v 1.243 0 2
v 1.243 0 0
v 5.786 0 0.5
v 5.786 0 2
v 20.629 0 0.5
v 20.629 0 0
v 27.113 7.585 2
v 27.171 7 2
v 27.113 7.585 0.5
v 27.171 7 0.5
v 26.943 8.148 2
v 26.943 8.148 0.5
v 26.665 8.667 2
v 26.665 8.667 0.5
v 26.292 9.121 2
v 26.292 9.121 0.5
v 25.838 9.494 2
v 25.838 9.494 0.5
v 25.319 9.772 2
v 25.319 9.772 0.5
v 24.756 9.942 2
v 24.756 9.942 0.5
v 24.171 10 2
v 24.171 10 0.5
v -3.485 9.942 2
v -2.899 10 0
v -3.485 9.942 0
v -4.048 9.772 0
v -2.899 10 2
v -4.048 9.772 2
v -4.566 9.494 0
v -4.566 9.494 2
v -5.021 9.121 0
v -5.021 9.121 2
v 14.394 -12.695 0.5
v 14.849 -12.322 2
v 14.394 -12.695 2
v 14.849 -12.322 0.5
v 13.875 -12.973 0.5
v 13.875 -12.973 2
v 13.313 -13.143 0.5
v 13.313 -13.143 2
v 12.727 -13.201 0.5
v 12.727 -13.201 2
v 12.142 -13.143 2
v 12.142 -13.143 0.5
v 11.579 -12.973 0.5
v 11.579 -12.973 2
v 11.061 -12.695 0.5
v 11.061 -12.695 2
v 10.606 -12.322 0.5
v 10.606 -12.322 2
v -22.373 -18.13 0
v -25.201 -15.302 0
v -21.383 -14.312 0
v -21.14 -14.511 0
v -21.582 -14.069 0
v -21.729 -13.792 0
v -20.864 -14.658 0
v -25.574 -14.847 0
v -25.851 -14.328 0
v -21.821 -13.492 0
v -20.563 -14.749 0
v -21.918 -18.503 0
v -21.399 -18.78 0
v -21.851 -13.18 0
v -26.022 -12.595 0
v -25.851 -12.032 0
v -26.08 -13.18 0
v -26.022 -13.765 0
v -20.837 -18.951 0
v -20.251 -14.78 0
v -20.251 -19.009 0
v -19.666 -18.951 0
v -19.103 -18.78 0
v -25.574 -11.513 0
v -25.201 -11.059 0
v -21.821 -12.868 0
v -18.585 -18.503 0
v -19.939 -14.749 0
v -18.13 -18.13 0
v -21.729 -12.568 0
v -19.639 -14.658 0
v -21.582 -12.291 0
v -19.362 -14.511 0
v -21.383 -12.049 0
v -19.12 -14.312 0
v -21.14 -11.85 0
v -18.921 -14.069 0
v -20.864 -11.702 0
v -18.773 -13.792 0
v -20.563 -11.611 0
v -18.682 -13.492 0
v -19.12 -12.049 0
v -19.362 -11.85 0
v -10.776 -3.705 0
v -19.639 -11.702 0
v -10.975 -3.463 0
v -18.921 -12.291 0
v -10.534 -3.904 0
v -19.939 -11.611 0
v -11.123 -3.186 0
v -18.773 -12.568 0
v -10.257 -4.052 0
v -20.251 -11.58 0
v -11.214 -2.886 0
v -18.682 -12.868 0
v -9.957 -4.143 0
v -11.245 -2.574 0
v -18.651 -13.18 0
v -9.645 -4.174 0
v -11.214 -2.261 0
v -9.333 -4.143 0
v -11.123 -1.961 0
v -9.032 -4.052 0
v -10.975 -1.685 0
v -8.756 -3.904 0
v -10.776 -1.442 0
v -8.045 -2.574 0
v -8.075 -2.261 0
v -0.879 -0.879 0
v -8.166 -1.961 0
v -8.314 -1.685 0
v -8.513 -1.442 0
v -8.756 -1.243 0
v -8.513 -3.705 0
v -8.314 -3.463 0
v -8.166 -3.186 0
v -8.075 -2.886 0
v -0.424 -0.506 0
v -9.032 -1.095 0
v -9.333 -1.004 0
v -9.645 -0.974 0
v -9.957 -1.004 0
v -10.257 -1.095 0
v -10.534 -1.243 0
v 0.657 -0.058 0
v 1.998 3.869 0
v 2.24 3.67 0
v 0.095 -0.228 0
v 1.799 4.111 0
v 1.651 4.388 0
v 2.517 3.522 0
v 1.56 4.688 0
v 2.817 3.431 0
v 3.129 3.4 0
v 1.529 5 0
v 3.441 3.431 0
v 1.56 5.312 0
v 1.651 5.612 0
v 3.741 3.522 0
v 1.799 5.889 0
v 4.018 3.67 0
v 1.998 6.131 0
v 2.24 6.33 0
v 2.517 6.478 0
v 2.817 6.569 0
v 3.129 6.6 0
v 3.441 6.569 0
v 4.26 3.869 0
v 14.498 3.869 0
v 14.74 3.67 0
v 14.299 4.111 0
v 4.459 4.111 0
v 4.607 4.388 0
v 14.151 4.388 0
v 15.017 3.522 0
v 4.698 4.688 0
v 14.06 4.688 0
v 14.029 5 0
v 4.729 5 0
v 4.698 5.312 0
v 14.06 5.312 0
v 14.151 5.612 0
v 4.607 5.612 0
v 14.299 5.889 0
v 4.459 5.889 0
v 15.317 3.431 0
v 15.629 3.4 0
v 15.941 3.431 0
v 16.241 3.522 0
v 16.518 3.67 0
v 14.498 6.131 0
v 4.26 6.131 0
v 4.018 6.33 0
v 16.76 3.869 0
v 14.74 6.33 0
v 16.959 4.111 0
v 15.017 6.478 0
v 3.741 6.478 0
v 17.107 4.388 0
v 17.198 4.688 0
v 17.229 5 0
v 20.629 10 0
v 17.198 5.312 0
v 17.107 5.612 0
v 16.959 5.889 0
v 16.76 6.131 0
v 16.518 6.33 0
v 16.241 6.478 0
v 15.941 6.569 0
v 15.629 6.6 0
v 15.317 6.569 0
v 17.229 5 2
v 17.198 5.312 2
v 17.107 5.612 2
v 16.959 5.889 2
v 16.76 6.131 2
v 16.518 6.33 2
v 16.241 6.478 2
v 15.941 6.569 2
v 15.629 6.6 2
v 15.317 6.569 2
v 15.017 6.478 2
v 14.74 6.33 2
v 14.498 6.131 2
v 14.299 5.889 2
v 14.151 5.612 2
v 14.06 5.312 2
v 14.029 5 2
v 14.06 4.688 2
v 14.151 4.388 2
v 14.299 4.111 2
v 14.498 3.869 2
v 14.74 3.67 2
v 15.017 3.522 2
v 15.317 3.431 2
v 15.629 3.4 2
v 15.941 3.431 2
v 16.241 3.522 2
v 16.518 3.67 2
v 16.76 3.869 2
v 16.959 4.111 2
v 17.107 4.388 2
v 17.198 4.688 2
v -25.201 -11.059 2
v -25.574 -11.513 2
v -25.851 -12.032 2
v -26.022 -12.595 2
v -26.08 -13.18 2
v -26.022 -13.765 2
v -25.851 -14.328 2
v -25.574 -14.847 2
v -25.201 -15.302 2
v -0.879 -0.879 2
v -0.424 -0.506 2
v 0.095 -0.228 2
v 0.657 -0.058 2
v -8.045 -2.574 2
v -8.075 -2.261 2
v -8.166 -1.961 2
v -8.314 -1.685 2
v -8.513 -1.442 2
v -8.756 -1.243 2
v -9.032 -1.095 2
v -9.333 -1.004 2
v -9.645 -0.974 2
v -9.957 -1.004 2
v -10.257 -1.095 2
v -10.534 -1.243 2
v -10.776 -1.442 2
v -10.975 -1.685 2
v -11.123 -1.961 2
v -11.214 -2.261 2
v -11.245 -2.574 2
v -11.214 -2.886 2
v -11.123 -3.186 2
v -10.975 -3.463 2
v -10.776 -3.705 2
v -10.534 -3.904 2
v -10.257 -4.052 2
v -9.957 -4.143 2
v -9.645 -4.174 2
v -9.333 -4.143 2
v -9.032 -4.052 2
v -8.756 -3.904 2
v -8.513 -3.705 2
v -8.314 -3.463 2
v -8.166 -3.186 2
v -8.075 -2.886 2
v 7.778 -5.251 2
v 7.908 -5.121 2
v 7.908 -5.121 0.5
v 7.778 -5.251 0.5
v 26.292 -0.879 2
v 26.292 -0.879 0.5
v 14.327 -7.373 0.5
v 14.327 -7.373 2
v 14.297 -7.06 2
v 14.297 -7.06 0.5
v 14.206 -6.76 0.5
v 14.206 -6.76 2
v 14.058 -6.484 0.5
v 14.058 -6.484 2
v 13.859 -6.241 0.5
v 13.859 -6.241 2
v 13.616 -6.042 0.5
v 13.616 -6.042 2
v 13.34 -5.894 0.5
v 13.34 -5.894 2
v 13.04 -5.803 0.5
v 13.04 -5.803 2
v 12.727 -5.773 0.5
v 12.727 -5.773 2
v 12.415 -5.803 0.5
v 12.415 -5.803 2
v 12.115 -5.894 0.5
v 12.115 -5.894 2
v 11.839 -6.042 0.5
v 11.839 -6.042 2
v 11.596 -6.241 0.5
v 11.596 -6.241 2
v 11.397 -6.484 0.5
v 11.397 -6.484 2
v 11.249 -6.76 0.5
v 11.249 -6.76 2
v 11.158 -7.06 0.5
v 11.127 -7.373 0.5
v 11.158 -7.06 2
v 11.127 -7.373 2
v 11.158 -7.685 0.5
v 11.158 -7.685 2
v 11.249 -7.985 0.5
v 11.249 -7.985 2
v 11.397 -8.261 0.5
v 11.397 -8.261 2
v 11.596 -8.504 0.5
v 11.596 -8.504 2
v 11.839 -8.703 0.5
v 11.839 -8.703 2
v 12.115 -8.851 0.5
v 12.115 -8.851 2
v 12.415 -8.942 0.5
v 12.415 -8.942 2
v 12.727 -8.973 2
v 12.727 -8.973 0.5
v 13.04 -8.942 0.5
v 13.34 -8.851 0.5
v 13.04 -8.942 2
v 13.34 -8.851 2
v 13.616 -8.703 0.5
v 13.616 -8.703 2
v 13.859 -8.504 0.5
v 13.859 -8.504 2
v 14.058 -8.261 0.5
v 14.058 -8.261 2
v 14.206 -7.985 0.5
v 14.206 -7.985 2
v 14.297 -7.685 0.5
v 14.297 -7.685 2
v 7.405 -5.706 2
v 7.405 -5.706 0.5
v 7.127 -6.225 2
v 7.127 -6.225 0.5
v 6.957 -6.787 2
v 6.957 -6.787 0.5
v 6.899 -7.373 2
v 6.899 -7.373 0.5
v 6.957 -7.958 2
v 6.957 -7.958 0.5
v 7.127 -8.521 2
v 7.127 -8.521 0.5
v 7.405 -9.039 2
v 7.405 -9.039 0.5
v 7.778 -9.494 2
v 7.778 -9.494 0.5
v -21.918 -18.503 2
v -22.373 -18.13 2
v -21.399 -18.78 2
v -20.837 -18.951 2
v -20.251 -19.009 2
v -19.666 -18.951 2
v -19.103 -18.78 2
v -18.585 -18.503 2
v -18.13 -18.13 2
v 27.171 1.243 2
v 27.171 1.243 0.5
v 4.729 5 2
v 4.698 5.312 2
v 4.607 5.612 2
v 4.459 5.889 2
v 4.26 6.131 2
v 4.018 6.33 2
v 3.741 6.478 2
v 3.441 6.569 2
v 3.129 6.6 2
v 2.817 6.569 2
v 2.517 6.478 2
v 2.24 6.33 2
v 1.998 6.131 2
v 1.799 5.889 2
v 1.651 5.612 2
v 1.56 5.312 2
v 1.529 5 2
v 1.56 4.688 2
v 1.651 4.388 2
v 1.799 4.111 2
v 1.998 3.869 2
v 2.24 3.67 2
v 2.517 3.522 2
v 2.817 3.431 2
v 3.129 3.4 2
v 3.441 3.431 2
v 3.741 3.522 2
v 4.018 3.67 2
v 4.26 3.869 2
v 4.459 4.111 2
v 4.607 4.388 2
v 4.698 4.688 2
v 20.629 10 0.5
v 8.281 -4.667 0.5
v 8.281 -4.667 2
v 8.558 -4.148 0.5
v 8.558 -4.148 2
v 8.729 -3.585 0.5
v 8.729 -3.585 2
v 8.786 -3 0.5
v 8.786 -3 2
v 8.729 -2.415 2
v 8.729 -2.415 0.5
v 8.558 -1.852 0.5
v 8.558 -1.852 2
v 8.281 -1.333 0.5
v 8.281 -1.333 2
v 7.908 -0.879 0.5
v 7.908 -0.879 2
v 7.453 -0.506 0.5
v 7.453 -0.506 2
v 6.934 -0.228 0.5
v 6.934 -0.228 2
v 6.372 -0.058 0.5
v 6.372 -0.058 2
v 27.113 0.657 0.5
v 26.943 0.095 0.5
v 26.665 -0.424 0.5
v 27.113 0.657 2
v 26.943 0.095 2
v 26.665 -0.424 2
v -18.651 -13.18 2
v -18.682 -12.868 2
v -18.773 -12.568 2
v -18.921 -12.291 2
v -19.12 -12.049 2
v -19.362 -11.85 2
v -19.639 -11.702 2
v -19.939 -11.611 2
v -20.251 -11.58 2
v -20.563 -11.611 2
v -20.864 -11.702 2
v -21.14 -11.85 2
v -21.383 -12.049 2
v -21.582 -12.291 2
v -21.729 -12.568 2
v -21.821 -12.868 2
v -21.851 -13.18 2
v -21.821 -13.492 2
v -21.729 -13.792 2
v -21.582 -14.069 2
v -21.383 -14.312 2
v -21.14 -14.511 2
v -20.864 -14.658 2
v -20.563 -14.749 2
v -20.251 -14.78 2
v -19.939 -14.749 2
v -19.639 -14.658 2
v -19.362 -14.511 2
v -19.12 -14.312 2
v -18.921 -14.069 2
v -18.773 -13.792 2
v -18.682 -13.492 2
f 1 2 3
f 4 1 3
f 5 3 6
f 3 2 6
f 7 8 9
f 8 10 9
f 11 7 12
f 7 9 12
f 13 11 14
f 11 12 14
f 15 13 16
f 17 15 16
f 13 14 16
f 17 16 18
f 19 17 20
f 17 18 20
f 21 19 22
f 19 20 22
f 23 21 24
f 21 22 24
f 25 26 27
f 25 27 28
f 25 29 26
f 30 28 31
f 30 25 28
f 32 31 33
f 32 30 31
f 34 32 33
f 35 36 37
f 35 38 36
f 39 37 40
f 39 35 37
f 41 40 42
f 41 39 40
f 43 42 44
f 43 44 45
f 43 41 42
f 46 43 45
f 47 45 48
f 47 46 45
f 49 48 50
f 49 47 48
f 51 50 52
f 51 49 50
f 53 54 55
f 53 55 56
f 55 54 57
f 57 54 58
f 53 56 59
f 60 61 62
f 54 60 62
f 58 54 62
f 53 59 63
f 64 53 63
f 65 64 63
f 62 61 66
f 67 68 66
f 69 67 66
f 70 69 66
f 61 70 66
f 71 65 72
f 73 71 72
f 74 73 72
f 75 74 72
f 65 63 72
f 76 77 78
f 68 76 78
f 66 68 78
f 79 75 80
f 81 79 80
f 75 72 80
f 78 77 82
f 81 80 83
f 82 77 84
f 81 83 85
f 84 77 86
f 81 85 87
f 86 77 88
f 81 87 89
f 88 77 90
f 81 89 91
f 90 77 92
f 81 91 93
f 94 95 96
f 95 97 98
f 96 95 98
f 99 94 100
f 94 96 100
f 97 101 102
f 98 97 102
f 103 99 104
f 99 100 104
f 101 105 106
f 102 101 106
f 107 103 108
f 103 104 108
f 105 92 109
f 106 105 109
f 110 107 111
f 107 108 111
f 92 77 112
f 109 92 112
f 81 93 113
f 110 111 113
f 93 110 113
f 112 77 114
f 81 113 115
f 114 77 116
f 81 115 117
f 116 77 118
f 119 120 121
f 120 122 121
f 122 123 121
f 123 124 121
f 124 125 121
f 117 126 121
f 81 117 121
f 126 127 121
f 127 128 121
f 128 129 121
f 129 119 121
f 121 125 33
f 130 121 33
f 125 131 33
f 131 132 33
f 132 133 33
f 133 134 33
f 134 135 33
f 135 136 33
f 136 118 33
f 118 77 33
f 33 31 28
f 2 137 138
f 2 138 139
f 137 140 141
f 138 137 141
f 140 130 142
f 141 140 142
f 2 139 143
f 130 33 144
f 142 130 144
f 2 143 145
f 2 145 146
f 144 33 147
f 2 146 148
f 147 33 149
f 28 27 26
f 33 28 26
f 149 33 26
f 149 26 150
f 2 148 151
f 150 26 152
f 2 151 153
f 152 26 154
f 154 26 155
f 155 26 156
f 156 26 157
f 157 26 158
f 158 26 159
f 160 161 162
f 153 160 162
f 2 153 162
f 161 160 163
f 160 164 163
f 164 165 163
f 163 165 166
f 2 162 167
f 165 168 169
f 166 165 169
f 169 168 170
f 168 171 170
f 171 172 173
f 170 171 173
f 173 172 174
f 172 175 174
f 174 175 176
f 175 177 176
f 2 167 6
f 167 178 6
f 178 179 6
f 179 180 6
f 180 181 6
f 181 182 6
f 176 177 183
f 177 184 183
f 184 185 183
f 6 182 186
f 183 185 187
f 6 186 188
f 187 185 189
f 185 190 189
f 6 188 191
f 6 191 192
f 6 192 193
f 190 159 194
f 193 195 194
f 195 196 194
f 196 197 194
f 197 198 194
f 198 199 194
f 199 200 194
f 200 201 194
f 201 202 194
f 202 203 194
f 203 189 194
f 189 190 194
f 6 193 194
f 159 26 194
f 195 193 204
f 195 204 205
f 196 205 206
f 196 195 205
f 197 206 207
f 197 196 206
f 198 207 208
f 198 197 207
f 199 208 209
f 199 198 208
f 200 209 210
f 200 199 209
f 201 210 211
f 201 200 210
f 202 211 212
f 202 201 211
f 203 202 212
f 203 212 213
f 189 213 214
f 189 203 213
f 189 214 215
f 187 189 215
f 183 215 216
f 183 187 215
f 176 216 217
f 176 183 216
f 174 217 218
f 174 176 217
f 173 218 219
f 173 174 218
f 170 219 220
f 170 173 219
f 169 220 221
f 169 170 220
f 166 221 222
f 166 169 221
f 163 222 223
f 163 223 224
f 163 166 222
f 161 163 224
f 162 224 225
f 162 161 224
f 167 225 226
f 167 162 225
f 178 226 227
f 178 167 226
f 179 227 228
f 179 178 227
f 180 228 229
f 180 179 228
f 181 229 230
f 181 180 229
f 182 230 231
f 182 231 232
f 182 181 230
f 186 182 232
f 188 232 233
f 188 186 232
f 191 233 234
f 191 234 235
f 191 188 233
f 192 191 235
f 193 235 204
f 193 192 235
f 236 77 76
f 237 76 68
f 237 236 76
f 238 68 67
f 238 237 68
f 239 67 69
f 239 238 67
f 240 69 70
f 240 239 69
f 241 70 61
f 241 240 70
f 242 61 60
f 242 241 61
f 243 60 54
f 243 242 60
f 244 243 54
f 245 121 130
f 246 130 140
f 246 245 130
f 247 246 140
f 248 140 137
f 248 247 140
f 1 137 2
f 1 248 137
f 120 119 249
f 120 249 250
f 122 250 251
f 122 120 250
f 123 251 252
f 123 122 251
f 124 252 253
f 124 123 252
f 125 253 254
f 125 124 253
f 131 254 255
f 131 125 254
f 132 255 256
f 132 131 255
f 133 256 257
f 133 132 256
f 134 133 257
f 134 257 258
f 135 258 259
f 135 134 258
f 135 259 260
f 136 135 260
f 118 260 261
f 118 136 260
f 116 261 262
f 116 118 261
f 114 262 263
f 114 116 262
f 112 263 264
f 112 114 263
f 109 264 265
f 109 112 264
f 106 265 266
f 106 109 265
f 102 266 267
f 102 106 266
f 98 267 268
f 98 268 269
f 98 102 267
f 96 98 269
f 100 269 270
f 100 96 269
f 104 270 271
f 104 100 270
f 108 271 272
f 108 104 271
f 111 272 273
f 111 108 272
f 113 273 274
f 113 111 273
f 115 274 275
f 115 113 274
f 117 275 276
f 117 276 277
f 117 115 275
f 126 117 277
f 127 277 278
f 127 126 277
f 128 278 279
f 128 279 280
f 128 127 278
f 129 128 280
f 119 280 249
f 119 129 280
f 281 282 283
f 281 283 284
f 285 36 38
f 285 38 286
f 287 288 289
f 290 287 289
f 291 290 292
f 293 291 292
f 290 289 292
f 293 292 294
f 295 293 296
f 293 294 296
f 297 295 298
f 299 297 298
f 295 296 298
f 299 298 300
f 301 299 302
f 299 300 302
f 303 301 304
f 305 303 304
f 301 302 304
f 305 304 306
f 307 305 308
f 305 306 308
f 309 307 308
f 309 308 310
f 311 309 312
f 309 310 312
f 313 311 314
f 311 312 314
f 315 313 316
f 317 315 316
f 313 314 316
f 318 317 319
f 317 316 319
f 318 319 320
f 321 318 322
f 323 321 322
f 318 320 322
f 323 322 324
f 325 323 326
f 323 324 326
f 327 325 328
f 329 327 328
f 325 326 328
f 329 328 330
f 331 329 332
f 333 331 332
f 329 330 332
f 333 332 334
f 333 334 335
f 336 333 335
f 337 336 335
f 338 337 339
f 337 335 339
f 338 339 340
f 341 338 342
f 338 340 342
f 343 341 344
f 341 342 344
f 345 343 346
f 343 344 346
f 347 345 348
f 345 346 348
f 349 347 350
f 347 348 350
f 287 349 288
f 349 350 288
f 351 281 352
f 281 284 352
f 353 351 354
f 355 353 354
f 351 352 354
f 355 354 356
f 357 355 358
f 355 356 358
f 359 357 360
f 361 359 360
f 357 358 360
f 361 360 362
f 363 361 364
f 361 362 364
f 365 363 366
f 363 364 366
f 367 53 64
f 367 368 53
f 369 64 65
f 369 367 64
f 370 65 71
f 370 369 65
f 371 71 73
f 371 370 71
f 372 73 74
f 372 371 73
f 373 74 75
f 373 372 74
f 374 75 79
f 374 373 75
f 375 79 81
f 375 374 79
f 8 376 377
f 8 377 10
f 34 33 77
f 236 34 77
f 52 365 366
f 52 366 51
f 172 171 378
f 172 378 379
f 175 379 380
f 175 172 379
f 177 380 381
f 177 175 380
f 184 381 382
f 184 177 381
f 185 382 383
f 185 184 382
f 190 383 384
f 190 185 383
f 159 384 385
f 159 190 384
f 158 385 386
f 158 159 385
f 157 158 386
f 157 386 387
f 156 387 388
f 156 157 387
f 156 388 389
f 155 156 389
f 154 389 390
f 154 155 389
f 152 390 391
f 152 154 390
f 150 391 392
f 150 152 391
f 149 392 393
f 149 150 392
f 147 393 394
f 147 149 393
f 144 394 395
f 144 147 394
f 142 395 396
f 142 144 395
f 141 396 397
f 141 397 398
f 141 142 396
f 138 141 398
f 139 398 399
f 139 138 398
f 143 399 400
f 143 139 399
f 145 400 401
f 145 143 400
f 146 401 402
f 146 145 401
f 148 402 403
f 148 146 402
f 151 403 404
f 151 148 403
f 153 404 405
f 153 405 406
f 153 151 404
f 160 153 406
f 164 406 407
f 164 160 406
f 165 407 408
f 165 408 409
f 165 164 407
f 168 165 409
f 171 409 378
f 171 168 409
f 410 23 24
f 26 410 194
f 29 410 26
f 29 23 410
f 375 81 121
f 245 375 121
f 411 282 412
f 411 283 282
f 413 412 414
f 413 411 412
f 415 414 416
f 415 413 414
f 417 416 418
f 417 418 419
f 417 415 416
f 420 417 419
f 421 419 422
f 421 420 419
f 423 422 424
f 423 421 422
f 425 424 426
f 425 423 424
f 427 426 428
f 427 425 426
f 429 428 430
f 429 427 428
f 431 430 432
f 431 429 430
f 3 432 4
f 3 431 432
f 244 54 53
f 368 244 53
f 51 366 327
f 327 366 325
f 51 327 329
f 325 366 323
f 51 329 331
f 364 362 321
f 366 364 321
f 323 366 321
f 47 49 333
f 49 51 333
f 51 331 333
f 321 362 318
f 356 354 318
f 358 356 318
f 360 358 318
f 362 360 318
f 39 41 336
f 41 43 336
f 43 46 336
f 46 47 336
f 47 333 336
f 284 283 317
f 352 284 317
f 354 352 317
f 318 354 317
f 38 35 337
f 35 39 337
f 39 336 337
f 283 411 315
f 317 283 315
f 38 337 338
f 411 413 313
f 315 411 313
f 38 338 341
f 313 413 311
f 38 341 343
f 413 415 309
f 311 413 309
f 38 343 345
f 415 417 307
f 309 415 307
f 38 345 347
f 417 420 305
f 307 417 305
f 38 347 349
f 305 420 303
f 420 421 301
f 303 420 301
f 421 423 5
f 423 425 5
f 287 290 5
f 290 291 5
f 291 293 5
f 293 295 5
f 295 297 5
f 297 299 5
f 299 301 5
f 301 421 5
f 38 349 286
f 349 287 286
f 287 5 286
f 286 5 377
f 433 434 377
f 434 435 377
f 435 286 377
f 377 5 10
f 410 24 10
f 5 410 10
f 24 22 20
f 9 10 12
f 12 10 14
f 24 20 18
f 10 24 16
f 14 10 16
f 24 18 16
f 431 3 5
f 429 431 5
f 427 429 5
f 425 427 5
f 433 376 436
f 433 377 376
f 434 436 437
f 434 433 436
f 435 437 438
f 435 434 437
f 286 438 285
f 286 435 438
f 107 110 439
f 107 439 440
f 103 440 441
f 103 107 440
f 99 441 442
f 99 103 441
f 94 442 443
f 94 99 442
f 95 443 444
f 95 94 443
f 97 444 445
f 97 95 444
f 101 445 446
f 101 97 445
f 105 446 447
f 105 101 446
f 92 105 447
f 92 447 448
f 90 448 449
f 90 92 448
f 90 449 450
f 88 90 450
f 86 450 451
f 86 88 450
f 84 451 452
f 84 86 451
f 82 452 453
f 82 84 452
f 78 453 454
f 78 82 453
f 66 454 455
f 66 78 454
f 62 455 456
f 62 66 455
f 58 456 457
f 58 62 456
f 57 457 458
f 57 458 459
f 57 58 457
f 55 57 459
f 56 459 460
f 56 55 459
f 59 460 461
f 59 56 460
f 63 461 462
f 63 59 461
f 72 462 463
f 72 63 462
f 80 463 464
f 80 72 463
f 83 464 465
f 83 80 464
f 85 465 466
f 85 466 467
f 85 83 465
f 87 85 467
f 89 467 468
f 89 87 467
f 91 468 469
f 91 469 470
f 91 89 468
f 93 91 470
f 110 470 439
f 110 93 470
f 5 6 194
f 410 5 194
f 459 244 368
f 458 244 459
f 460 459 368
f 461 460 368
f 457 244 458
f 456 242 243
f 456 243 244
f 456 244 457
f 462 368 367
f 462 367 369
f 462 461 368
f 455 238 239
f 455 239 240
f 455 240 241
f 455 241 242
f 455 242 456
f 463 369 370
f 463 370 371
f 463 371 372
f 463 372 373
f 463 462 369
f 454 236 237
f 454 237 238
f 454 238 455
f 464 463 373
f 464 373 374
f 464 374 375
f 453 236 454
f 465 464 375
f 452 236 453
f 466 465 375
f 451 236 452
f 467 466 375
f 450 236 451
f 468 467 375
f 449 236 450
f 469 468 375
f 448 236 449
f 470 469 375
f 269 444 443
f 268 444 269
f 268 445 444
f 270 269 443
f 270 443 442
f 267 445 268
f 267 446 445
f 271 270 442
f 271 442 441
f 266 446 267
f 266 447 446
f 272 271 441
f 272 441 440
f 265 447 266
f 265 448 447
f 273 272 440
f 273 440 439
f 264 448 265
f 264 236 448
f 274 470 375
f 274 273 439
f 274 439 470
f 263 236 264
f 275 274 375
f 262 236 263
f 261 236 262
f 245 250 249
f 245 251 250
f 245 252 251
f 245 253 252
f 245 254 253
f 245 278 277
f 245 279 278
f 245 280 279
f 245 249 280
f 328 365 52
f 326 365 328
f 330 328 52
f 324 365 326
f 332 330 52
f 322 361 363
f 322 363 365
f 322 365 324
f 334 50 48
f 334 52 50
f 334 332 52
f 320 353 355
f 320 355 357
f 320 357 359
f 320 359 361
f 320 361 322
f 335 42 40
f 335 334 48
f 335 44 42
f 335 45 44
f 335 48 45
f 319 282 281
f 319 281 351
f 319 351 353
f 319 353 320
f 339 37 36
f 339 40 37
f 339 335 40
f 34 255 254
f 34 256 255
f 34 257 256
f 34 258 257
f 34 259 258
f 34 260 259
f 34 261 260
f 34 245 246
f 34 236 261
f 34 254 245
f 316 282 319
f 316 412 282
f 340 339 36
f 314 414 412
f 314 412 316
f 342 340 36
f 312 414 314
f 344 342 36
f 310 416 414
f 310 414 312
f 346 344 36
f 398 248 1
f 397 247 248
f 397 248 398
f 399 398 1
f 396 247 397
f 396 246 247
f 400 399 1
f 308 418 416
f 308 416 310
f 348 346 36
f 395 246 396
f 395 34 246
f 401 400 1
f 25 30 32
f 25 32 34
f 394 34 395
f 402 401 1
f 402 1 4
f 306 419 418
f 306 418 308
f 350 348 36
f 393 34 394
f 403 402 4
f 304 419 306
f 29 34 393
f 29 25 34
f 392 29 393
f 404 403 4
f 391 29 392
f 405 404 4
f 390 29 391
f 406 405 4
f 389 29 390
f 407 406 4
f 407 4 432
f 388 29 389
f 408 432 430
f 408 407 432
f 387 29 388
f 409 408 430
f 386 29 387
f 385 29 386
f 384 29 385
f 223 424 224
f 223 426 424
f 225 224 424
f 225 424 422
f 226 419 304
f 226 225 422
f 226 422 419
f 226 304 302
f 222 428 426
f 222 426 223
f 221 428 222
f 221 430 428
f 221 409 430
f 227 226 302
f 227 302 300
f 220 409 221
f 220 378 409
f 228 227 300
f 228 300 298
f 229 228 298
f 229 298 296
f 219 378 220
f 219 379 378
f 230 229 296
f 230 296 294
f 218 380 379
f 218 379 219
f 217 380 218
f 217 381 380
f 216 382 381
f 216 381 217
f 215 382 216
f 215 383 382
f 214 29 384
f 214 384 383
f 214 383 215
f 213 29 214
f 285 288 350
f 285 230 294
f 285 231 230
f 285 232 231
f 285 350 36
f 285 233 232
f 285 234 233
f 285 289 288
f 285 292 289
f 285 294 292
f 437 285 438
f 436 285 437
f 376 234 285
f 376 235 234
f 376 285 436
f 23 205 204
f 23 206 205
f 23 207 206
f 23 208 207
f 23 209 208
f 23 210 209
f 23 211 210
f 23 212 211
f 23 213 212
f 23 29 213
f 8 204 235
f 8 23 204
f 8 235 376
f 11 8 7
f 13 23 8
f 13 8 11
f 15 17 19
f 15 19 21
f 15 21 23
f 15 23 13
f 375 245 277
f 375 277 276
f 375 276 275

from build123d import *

# Parameters (mm, degrees)
SKETCH_1_R      = 1.6
EXTRUDE_1_DEPTH = 2
SKETCH_3_R      = 1.6
EXTRUDE_2_DEPTH = 1.5
FILLET_2_R      = 3


with BuildPart() as part:
    # ｽｹｯﾁ1 → ﾎﾞｽ - 押し出し1 (new body)
    with BuildSketch(Plane.XY):
        Polygon((-27.32233047, -13.180194847), (-20.251262658, -20.251262658), (0, 0), (20.628932188, 0), (20.628932188, 10), (-4.142135624, 10), align=None)
        with Locations((3.128932188, 5)):
            Circle(SKETCH_1_R, mode=Mode.SUBTRACT)
        with Locations((15.628932188, 5)):
            Circle(SKETCH_1_R, mode=Mode.SUBTRACT)
        with Locations((-20.251262658, -13.180194847)):
            Circle(SKETCH_1_R, mode=Mode.SUBTRACT)
        with Locations((-9.644660941, -2.573593129)):
            Circle(SKETCH_1_R, mode=Mode.SUBTRACT)
    extrude(amount=EXTRUDE_1_DEPTH)

    # ｽｹｯﾁ3 → ﾎﾞｽ - 押し出し2 (add)
    with BuildSketch(Plane.XY.offset(2)):
        Polygon((13.028932188, 0), (5.656349186, -7.372583002), (12.727416998, -14.443650814), (27.171067812, 0), (27.171067812, 10), (20.628932188, 10), (20.628932188, 0), align=None)
        with Locations((12.727416998, -7.372583002)):
            Circle(SKETCH_3_R, mode=Mode.SUBTRACT)
    extrude(amount=-EXTRUDE_2_DEPTH)

    # ﾌｨﾚｯﾄ2
    fillet_2_edges = [part.edges().sort_by_distance(p)[0] for p in [
        (-4.142135624, 10, 1),
        (0, 0, 1),
        (-20.251262658, -20.251262658, 1),
        (-27.32233047, -13.180194847, 1),
        (27.171067812, 10, 1.25),
        (27.171067812, 0, 1.25),
        (12.727416998, -14.443650814, 1.25),
        (5.656349186, -7.372583002, 1.25),
        (13.028932188, 0, 1.25),
    ]]
    fillet(fillet_2_edges, radius=FILLET_2_R)


solid = part.part
